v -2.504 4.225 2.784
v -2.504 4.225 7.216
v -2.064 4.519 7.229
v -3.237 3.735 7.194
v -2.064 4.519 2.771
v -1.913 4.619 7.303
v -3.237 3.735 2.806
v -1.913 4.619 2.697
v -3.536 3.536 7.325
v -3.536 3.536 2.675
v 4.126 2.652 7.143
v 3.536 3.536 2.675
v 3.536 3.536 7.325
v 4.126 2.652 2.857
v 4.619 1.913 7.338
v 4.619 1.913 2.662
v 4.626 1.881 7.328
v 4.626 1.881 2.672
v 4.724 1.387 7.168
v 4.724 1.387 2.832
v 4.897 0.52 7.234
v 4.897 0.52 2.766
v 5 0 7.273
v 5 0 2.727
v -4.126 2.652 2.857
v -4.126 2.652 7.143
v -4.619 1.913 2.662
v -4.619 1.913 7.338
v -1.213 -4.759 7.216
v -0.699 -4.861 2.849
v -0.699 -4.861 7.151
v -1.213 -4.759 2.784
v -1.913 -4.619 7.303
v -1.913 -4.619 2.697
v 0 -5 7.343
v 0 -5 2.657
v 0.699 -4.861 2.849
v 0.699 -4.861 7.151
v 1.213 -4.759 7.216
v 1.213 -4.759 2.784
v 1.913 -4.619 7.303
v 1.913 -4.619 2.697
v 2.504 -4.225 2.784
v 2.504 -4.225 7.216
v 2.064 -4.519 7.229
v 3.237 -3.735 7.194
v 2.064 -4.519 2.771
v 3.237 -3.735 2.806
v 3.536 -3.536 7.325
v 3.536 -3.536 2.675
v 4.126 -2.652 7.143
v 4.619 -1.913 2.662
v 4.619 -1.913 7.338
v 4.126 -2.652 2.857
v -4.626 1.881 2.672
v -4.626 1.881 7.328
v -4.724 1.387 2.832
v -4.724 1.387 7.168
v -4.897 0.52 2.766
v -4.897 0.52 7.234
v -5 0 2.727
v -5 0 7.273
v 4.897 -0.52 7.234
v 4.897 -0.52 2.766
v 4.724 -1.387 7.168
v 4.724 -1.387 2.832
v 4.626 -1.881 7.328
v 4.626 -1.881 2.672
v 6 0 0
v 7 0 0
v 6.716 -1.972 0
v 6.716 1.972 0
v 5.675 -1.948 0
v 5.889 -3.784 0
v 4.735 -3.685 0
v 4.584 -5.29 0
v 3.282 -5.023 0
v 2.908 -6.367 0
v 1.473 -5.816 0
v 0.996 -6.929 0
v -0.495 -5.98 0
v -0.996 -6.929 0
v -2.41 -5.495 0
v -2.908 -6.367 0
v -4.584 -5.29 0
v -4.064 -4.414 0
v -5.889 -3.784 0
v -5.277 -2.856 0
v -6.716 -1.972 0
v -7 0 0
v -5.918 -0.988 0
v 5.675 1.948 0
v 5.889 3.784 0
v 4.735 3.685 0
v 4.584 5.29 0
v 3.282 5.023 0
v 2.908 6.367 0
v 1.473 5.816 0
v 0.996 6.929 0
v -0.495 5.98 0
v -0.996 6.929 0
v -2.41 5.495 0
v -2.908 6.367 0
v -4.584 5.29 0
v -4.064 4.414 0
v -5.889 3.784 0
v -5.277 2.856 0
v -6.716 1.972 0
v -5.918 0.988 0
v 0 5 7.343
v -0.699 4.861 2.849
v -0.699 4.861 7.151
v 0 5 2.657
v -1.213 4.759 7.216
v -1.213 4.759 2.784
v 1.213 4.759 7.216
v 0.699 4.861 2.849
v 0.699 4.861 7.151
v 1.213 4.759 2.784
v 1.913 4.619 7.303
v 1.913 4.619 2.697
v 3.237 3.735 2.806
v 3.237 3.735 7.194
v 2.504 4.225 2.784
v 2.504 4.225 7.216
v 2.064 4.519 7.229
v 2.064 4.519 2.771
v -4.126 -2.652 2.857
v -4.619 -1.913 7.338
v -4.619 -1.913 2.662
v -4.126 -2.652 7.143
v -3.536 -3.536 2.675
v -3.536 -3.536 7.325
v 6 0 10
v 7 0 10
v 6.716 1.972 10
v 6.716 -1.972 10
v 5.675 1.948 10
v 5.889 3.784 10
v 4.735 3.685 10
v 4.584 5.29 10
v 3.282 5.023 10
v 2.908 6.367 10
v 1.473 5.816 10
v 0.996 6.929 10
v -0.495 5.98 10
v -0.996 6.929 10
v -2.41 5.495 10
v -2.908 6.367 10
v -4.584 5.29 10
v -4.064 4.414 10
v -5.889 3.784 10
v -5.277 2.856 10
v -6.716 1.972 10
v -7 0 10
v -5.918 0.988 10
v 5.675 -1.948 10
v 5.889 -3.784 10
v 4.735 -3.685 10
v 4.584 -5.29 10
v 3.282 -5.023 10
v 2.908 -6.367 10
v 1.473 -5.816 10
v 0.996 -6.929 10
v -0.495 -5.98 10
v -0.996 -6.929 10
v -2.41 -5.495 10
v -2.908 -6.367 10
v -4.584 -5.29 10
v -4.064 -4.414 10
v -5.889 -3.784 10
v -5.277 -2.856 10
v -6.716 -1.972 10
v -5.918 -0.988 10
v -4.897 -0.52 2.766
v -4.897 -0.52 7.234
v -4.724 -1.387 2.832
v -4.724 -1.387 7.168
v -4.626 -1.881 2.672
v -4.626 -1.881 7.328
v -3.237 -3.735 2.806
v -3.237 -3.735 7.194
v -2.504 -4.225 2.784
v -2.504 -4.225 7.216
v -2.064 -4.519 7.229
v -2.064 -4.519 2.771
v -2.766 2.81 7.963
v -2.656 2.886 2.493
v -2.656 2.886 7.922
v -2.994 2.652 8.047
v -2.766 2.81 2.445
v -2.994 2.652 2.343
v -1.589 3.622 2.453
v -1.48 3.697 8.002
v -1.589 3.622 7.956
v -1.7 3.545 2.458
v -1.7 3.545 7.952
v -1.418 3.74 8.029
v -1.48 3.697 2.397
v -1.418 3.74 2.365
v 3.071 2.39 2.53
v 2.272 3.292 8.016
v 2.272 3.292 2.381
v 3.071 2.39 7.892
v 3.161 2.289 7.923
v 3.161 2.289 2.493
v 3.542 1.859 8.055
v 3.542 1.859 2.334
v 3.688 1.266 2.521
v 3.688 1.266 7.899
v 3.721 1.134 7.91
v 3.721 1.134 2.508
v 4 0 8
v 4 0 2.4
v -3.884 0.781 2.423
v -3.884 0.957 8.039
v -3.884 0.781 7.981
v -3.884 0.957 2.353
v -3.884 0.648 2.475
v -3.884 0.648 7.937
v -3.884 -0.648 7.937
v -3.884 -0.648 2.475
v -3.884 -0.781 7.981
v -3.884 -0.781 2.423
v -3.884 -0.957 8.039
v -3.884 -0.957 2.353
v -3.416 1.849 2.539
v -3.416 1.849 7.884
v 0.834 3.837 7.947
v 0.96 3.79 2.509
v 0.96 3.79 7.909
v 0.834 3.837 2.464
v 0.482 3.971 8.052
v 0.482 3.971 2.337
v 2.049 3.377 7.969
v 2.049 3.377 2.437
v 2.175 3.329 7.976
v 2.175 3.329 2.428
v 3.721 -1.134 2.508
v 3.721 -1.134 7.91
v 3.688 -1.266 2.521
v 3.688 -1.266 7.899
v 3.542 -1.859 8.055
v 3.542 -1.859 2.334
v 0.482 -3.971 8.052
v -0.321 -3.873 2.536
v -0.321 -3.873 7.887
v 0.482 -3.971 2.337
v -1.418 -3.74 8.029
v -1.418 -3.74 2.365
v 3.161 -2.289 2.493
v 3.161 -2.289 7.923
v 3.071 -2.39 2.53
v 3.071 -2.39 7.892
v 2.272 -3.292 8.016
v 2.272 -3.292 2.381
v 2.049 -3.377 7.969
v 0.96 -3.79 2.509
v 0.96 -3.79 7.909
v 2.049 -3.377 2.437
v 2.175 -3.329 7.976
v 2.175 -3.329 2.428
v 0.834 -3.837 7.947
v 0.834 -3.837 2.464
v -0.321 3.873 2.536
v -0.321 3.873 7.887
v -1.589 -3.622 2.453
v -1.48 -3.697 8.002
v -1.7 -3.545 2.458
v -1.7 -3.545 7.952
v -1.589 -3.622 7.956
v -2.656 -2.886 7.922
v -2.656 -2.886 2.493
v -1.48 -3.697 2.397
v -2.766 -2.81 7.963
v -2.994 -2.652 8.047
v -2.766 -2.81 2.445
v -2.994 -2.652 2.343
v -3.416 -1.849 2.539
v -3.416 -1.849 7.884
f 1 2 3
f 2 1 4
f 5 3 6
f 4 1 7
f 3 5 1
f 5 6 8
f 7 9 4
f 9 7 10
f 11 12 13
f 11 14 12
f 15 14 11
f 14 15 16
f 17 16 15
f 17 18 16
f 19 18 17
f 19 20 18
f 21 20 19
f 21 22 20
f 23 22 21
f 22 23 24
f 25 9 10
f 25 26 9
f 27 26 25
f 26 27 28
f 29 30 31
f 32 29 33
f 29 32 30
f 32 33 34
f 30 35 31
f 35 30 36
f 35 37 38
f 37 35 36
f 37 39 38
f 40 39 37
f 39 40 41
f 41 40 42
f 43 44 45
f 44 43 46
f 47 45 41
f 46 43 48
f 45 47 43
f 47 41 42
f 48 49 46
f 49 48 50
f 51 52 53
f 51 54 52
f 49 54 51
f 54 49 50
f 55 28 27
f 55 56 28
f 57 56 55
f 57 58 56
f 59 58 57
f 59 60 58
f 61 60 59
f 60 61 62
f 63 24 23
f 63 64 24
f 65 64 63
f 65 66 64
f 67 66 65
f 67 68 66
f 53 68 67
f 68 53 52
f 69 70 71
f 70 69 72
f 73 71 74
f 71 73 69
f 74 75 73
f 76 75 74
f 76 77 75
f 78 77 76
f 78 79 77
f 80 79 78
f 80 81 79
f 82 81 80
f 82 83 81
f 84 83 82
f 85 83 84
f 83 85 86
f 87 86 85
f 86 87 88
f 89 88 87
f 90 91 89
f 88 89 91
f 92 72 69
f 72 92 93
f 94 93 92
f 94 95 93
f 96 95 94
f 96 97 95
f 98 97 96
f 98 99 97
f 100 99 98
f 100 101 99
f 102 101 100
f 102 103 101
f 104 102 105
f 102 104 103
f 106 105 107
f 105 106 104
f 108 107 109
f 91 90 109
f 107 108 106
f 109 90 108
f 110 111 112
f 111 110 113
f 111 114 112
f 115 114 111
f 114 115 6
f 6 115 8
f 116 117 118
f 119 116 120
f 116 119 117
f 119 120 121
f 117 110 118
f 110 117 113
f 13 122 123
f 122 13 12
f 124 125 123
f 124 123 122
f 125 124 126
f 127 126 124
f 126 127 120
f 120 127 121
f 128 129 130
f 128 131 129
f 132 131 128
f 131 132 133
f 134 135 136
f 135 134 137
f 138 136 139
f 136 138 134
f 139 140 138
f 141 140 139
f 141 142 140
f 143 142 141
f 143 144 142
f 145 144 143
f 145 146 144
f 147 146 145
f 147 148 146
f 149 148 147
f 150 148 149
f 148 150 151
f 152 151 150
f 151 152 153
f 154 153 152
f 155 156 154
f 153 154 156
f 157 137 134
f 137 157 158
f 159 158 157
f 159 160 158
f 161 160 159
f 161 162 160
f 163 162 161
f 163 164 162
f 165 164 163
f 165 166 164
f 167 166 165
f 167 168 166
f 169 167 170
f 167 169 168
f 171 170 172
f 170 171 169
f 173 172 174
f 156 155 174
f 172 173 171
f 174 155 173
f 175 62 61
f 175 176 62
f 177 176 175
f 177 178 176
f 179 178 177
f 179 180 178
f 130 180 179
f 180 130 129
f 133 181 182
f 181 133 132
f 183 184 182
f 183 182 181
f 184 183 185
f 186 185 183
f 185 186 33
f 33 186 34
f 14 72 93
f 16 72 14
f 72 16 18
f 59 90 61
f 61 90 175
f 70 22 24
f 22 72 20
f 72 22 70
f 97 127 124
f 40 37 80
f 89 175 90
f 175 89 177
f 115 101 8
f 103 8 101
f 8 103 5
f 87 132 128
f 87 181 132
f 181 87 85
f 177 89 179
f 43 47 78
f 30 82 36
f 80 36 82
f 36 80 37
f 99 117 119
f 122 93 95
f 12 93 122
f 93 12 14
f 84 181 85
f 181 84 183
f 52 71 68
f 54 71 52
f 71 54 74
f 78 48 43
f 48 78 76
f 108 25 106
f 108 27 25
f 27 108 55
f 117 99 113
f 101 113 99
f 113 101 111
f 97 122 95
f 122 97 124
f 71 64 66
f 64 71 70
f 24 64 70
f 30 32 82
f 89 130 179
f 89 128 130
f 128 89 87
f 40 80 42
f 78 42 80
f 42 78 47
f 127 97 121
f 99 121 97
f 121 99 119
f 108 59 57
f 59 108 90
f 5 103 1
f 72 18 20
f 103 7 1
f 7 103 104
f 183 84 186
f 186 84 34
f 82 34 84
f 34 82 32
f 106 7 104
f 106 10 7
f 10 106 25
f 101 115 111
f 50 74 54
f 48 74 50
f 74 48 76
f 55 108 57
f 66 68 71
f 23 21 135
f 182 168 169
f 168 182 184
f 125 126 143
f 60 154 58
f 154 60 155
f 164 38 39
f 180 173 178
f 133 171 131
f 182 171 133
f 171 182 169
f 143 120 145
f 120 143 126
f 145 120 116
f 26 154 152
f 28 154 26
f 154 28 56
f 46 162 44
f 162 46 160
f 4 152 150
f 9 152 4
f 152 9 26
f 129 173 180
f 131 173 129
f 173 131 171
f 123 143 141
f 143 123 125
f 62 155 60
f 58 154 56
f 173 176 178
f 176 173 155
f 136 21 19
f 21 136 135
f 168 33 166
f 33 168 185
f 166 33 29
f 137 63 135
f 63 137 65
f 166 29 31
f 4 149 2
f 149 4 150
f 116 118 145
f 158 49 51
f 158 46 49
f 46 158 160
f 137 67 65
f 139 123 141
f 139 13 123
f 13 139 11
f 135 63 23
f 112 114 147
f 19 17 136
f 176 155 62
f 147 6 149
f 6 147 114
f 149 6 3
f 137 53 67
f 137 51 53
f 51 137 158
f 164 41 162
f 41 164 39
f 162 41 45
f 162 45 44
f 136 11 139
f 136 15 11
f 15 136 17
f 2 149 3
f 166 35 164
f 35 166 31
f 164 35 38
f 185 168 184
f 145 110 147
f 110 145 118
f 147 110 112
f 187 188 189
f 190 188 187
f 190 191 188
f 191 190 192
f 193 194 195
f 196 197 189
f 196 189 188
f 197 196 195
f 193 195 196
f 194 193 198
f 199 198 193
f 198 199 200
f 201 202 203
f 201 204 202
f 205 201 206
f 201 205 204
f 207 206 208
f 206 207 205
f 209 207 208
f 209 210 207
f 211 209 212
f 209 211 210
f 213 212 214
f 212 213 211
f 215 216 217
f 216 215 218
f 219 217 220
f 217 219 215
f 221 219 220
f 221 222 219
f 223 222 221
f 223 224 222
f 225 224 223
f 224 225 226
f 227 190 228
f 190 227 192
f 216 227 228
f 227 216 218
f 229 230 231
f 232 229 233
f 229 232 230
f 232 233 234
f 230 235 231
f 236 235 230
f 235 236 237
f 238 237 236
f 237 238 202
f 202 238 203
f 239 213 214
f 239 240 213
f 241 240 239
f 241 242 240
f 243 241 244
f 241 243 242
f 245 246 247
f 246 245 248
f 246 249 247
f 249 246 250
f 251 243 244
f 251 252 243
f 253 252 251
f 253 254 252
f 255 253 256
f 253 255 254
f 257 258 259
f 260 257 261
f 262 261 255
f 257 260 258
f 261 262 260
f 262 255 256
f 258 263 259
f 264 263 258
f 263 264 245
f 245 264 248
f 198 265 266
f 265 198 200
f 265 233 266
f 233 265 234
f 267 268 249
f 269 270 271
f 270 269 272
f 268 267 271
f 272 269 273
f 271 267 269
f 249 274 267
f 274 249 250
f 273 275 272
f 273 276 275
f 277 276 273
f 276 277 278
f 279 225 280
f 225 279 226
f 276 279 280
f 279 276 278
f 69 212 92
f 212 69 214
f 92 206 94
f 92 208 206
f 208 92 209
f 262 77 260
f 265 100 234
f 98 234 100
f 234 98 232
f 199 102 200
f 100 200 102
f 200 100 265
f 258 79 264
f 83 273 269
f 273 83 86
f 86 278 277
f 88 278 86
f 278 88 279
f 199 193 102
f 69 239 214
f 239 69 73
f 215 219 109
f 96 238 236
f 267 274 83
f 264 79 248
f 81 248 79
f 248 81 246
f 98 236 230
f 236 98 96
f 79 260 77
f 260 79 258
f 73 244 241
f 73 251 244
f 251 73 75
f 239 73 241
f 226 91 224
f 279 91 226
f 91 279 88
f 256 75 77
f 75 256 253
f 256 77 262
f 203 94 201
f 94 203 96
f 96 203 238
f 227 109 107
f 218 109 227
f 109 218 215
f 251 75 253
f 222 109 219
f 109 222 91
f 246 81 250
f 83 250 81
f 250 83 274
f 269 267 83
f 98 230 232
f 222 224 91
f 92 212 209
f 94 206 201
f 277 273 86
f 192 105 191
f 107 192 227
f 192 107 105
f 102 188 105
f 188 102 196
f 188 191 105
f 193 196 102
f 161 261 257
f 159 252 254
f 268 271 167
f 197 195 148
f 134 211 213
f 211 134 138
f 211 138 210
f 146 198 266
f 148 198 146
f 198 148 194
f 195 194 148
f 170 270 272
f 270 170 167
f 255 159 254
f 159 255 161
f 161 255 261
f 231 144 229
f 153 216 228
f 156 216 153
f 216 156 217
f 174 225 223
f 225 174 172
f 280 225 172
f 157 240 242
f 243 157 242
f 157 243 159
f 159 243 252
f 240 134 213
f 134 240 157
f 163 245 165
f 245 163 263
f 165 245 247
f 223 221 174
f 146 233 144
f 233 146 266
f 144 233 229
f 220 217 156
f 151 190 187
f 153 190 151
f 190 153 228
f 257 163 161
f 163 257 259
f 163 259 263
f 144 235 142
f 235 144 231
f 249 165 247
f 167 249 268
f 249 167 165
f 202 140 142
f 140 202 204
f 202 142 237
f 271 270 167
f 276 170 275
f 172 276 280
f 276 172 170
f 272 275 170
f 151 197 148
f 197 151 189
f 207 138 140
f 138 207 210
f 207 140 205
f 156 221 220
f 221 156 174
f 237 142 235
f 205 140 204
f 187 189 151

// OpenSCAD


//Choose the size of plug you want.
gauge=10;//[3,3.97,4,4.67,5,6,6.35,7,7.94,8,9,9.53,10,11,11.1,12,12.7,13,14,14.3,15,15.9,16,17,18,19,19.1,20,21,22,22.2,23,24,25,25.4,26,27,28,29,29.37,30,30.07,31,31.75,32,33,33.34,34,34.93,35,36,36.5,37,38,38.1,39,39.7,40,41,41.3,42,43,44,44.5,45,46,47,47.6,48,49,50,50.8]

//Choose how thick your ear is 1-10.
depth=10;//[1:10]

//Choose hole size: 10=no hole, 1=thin walls.
thickness=1;//[1:27]

module ear_gauge();
{
	difference()
	{
		union()
		{
			cylinder(depth,gauge/2,gauge/2);
			cylinder(depth/2,(gauge/2)+2,(gauge/3));
			translate([0,0,(depth/2)])cylinder(depth/2,(gauge/3),(gauge/2)+2);
		}
		union()
		{
			cylinder(depth,(gauge/2)-thickness,(gauge/2)-thickness);
			cylinder((depth/2)+1,((gauge/2)+2)-thickness,1);
			translate([0,0,depth/2])cylinder((depth/2),1,((gauge/2)+2)-thickness);
		}
	}
}
